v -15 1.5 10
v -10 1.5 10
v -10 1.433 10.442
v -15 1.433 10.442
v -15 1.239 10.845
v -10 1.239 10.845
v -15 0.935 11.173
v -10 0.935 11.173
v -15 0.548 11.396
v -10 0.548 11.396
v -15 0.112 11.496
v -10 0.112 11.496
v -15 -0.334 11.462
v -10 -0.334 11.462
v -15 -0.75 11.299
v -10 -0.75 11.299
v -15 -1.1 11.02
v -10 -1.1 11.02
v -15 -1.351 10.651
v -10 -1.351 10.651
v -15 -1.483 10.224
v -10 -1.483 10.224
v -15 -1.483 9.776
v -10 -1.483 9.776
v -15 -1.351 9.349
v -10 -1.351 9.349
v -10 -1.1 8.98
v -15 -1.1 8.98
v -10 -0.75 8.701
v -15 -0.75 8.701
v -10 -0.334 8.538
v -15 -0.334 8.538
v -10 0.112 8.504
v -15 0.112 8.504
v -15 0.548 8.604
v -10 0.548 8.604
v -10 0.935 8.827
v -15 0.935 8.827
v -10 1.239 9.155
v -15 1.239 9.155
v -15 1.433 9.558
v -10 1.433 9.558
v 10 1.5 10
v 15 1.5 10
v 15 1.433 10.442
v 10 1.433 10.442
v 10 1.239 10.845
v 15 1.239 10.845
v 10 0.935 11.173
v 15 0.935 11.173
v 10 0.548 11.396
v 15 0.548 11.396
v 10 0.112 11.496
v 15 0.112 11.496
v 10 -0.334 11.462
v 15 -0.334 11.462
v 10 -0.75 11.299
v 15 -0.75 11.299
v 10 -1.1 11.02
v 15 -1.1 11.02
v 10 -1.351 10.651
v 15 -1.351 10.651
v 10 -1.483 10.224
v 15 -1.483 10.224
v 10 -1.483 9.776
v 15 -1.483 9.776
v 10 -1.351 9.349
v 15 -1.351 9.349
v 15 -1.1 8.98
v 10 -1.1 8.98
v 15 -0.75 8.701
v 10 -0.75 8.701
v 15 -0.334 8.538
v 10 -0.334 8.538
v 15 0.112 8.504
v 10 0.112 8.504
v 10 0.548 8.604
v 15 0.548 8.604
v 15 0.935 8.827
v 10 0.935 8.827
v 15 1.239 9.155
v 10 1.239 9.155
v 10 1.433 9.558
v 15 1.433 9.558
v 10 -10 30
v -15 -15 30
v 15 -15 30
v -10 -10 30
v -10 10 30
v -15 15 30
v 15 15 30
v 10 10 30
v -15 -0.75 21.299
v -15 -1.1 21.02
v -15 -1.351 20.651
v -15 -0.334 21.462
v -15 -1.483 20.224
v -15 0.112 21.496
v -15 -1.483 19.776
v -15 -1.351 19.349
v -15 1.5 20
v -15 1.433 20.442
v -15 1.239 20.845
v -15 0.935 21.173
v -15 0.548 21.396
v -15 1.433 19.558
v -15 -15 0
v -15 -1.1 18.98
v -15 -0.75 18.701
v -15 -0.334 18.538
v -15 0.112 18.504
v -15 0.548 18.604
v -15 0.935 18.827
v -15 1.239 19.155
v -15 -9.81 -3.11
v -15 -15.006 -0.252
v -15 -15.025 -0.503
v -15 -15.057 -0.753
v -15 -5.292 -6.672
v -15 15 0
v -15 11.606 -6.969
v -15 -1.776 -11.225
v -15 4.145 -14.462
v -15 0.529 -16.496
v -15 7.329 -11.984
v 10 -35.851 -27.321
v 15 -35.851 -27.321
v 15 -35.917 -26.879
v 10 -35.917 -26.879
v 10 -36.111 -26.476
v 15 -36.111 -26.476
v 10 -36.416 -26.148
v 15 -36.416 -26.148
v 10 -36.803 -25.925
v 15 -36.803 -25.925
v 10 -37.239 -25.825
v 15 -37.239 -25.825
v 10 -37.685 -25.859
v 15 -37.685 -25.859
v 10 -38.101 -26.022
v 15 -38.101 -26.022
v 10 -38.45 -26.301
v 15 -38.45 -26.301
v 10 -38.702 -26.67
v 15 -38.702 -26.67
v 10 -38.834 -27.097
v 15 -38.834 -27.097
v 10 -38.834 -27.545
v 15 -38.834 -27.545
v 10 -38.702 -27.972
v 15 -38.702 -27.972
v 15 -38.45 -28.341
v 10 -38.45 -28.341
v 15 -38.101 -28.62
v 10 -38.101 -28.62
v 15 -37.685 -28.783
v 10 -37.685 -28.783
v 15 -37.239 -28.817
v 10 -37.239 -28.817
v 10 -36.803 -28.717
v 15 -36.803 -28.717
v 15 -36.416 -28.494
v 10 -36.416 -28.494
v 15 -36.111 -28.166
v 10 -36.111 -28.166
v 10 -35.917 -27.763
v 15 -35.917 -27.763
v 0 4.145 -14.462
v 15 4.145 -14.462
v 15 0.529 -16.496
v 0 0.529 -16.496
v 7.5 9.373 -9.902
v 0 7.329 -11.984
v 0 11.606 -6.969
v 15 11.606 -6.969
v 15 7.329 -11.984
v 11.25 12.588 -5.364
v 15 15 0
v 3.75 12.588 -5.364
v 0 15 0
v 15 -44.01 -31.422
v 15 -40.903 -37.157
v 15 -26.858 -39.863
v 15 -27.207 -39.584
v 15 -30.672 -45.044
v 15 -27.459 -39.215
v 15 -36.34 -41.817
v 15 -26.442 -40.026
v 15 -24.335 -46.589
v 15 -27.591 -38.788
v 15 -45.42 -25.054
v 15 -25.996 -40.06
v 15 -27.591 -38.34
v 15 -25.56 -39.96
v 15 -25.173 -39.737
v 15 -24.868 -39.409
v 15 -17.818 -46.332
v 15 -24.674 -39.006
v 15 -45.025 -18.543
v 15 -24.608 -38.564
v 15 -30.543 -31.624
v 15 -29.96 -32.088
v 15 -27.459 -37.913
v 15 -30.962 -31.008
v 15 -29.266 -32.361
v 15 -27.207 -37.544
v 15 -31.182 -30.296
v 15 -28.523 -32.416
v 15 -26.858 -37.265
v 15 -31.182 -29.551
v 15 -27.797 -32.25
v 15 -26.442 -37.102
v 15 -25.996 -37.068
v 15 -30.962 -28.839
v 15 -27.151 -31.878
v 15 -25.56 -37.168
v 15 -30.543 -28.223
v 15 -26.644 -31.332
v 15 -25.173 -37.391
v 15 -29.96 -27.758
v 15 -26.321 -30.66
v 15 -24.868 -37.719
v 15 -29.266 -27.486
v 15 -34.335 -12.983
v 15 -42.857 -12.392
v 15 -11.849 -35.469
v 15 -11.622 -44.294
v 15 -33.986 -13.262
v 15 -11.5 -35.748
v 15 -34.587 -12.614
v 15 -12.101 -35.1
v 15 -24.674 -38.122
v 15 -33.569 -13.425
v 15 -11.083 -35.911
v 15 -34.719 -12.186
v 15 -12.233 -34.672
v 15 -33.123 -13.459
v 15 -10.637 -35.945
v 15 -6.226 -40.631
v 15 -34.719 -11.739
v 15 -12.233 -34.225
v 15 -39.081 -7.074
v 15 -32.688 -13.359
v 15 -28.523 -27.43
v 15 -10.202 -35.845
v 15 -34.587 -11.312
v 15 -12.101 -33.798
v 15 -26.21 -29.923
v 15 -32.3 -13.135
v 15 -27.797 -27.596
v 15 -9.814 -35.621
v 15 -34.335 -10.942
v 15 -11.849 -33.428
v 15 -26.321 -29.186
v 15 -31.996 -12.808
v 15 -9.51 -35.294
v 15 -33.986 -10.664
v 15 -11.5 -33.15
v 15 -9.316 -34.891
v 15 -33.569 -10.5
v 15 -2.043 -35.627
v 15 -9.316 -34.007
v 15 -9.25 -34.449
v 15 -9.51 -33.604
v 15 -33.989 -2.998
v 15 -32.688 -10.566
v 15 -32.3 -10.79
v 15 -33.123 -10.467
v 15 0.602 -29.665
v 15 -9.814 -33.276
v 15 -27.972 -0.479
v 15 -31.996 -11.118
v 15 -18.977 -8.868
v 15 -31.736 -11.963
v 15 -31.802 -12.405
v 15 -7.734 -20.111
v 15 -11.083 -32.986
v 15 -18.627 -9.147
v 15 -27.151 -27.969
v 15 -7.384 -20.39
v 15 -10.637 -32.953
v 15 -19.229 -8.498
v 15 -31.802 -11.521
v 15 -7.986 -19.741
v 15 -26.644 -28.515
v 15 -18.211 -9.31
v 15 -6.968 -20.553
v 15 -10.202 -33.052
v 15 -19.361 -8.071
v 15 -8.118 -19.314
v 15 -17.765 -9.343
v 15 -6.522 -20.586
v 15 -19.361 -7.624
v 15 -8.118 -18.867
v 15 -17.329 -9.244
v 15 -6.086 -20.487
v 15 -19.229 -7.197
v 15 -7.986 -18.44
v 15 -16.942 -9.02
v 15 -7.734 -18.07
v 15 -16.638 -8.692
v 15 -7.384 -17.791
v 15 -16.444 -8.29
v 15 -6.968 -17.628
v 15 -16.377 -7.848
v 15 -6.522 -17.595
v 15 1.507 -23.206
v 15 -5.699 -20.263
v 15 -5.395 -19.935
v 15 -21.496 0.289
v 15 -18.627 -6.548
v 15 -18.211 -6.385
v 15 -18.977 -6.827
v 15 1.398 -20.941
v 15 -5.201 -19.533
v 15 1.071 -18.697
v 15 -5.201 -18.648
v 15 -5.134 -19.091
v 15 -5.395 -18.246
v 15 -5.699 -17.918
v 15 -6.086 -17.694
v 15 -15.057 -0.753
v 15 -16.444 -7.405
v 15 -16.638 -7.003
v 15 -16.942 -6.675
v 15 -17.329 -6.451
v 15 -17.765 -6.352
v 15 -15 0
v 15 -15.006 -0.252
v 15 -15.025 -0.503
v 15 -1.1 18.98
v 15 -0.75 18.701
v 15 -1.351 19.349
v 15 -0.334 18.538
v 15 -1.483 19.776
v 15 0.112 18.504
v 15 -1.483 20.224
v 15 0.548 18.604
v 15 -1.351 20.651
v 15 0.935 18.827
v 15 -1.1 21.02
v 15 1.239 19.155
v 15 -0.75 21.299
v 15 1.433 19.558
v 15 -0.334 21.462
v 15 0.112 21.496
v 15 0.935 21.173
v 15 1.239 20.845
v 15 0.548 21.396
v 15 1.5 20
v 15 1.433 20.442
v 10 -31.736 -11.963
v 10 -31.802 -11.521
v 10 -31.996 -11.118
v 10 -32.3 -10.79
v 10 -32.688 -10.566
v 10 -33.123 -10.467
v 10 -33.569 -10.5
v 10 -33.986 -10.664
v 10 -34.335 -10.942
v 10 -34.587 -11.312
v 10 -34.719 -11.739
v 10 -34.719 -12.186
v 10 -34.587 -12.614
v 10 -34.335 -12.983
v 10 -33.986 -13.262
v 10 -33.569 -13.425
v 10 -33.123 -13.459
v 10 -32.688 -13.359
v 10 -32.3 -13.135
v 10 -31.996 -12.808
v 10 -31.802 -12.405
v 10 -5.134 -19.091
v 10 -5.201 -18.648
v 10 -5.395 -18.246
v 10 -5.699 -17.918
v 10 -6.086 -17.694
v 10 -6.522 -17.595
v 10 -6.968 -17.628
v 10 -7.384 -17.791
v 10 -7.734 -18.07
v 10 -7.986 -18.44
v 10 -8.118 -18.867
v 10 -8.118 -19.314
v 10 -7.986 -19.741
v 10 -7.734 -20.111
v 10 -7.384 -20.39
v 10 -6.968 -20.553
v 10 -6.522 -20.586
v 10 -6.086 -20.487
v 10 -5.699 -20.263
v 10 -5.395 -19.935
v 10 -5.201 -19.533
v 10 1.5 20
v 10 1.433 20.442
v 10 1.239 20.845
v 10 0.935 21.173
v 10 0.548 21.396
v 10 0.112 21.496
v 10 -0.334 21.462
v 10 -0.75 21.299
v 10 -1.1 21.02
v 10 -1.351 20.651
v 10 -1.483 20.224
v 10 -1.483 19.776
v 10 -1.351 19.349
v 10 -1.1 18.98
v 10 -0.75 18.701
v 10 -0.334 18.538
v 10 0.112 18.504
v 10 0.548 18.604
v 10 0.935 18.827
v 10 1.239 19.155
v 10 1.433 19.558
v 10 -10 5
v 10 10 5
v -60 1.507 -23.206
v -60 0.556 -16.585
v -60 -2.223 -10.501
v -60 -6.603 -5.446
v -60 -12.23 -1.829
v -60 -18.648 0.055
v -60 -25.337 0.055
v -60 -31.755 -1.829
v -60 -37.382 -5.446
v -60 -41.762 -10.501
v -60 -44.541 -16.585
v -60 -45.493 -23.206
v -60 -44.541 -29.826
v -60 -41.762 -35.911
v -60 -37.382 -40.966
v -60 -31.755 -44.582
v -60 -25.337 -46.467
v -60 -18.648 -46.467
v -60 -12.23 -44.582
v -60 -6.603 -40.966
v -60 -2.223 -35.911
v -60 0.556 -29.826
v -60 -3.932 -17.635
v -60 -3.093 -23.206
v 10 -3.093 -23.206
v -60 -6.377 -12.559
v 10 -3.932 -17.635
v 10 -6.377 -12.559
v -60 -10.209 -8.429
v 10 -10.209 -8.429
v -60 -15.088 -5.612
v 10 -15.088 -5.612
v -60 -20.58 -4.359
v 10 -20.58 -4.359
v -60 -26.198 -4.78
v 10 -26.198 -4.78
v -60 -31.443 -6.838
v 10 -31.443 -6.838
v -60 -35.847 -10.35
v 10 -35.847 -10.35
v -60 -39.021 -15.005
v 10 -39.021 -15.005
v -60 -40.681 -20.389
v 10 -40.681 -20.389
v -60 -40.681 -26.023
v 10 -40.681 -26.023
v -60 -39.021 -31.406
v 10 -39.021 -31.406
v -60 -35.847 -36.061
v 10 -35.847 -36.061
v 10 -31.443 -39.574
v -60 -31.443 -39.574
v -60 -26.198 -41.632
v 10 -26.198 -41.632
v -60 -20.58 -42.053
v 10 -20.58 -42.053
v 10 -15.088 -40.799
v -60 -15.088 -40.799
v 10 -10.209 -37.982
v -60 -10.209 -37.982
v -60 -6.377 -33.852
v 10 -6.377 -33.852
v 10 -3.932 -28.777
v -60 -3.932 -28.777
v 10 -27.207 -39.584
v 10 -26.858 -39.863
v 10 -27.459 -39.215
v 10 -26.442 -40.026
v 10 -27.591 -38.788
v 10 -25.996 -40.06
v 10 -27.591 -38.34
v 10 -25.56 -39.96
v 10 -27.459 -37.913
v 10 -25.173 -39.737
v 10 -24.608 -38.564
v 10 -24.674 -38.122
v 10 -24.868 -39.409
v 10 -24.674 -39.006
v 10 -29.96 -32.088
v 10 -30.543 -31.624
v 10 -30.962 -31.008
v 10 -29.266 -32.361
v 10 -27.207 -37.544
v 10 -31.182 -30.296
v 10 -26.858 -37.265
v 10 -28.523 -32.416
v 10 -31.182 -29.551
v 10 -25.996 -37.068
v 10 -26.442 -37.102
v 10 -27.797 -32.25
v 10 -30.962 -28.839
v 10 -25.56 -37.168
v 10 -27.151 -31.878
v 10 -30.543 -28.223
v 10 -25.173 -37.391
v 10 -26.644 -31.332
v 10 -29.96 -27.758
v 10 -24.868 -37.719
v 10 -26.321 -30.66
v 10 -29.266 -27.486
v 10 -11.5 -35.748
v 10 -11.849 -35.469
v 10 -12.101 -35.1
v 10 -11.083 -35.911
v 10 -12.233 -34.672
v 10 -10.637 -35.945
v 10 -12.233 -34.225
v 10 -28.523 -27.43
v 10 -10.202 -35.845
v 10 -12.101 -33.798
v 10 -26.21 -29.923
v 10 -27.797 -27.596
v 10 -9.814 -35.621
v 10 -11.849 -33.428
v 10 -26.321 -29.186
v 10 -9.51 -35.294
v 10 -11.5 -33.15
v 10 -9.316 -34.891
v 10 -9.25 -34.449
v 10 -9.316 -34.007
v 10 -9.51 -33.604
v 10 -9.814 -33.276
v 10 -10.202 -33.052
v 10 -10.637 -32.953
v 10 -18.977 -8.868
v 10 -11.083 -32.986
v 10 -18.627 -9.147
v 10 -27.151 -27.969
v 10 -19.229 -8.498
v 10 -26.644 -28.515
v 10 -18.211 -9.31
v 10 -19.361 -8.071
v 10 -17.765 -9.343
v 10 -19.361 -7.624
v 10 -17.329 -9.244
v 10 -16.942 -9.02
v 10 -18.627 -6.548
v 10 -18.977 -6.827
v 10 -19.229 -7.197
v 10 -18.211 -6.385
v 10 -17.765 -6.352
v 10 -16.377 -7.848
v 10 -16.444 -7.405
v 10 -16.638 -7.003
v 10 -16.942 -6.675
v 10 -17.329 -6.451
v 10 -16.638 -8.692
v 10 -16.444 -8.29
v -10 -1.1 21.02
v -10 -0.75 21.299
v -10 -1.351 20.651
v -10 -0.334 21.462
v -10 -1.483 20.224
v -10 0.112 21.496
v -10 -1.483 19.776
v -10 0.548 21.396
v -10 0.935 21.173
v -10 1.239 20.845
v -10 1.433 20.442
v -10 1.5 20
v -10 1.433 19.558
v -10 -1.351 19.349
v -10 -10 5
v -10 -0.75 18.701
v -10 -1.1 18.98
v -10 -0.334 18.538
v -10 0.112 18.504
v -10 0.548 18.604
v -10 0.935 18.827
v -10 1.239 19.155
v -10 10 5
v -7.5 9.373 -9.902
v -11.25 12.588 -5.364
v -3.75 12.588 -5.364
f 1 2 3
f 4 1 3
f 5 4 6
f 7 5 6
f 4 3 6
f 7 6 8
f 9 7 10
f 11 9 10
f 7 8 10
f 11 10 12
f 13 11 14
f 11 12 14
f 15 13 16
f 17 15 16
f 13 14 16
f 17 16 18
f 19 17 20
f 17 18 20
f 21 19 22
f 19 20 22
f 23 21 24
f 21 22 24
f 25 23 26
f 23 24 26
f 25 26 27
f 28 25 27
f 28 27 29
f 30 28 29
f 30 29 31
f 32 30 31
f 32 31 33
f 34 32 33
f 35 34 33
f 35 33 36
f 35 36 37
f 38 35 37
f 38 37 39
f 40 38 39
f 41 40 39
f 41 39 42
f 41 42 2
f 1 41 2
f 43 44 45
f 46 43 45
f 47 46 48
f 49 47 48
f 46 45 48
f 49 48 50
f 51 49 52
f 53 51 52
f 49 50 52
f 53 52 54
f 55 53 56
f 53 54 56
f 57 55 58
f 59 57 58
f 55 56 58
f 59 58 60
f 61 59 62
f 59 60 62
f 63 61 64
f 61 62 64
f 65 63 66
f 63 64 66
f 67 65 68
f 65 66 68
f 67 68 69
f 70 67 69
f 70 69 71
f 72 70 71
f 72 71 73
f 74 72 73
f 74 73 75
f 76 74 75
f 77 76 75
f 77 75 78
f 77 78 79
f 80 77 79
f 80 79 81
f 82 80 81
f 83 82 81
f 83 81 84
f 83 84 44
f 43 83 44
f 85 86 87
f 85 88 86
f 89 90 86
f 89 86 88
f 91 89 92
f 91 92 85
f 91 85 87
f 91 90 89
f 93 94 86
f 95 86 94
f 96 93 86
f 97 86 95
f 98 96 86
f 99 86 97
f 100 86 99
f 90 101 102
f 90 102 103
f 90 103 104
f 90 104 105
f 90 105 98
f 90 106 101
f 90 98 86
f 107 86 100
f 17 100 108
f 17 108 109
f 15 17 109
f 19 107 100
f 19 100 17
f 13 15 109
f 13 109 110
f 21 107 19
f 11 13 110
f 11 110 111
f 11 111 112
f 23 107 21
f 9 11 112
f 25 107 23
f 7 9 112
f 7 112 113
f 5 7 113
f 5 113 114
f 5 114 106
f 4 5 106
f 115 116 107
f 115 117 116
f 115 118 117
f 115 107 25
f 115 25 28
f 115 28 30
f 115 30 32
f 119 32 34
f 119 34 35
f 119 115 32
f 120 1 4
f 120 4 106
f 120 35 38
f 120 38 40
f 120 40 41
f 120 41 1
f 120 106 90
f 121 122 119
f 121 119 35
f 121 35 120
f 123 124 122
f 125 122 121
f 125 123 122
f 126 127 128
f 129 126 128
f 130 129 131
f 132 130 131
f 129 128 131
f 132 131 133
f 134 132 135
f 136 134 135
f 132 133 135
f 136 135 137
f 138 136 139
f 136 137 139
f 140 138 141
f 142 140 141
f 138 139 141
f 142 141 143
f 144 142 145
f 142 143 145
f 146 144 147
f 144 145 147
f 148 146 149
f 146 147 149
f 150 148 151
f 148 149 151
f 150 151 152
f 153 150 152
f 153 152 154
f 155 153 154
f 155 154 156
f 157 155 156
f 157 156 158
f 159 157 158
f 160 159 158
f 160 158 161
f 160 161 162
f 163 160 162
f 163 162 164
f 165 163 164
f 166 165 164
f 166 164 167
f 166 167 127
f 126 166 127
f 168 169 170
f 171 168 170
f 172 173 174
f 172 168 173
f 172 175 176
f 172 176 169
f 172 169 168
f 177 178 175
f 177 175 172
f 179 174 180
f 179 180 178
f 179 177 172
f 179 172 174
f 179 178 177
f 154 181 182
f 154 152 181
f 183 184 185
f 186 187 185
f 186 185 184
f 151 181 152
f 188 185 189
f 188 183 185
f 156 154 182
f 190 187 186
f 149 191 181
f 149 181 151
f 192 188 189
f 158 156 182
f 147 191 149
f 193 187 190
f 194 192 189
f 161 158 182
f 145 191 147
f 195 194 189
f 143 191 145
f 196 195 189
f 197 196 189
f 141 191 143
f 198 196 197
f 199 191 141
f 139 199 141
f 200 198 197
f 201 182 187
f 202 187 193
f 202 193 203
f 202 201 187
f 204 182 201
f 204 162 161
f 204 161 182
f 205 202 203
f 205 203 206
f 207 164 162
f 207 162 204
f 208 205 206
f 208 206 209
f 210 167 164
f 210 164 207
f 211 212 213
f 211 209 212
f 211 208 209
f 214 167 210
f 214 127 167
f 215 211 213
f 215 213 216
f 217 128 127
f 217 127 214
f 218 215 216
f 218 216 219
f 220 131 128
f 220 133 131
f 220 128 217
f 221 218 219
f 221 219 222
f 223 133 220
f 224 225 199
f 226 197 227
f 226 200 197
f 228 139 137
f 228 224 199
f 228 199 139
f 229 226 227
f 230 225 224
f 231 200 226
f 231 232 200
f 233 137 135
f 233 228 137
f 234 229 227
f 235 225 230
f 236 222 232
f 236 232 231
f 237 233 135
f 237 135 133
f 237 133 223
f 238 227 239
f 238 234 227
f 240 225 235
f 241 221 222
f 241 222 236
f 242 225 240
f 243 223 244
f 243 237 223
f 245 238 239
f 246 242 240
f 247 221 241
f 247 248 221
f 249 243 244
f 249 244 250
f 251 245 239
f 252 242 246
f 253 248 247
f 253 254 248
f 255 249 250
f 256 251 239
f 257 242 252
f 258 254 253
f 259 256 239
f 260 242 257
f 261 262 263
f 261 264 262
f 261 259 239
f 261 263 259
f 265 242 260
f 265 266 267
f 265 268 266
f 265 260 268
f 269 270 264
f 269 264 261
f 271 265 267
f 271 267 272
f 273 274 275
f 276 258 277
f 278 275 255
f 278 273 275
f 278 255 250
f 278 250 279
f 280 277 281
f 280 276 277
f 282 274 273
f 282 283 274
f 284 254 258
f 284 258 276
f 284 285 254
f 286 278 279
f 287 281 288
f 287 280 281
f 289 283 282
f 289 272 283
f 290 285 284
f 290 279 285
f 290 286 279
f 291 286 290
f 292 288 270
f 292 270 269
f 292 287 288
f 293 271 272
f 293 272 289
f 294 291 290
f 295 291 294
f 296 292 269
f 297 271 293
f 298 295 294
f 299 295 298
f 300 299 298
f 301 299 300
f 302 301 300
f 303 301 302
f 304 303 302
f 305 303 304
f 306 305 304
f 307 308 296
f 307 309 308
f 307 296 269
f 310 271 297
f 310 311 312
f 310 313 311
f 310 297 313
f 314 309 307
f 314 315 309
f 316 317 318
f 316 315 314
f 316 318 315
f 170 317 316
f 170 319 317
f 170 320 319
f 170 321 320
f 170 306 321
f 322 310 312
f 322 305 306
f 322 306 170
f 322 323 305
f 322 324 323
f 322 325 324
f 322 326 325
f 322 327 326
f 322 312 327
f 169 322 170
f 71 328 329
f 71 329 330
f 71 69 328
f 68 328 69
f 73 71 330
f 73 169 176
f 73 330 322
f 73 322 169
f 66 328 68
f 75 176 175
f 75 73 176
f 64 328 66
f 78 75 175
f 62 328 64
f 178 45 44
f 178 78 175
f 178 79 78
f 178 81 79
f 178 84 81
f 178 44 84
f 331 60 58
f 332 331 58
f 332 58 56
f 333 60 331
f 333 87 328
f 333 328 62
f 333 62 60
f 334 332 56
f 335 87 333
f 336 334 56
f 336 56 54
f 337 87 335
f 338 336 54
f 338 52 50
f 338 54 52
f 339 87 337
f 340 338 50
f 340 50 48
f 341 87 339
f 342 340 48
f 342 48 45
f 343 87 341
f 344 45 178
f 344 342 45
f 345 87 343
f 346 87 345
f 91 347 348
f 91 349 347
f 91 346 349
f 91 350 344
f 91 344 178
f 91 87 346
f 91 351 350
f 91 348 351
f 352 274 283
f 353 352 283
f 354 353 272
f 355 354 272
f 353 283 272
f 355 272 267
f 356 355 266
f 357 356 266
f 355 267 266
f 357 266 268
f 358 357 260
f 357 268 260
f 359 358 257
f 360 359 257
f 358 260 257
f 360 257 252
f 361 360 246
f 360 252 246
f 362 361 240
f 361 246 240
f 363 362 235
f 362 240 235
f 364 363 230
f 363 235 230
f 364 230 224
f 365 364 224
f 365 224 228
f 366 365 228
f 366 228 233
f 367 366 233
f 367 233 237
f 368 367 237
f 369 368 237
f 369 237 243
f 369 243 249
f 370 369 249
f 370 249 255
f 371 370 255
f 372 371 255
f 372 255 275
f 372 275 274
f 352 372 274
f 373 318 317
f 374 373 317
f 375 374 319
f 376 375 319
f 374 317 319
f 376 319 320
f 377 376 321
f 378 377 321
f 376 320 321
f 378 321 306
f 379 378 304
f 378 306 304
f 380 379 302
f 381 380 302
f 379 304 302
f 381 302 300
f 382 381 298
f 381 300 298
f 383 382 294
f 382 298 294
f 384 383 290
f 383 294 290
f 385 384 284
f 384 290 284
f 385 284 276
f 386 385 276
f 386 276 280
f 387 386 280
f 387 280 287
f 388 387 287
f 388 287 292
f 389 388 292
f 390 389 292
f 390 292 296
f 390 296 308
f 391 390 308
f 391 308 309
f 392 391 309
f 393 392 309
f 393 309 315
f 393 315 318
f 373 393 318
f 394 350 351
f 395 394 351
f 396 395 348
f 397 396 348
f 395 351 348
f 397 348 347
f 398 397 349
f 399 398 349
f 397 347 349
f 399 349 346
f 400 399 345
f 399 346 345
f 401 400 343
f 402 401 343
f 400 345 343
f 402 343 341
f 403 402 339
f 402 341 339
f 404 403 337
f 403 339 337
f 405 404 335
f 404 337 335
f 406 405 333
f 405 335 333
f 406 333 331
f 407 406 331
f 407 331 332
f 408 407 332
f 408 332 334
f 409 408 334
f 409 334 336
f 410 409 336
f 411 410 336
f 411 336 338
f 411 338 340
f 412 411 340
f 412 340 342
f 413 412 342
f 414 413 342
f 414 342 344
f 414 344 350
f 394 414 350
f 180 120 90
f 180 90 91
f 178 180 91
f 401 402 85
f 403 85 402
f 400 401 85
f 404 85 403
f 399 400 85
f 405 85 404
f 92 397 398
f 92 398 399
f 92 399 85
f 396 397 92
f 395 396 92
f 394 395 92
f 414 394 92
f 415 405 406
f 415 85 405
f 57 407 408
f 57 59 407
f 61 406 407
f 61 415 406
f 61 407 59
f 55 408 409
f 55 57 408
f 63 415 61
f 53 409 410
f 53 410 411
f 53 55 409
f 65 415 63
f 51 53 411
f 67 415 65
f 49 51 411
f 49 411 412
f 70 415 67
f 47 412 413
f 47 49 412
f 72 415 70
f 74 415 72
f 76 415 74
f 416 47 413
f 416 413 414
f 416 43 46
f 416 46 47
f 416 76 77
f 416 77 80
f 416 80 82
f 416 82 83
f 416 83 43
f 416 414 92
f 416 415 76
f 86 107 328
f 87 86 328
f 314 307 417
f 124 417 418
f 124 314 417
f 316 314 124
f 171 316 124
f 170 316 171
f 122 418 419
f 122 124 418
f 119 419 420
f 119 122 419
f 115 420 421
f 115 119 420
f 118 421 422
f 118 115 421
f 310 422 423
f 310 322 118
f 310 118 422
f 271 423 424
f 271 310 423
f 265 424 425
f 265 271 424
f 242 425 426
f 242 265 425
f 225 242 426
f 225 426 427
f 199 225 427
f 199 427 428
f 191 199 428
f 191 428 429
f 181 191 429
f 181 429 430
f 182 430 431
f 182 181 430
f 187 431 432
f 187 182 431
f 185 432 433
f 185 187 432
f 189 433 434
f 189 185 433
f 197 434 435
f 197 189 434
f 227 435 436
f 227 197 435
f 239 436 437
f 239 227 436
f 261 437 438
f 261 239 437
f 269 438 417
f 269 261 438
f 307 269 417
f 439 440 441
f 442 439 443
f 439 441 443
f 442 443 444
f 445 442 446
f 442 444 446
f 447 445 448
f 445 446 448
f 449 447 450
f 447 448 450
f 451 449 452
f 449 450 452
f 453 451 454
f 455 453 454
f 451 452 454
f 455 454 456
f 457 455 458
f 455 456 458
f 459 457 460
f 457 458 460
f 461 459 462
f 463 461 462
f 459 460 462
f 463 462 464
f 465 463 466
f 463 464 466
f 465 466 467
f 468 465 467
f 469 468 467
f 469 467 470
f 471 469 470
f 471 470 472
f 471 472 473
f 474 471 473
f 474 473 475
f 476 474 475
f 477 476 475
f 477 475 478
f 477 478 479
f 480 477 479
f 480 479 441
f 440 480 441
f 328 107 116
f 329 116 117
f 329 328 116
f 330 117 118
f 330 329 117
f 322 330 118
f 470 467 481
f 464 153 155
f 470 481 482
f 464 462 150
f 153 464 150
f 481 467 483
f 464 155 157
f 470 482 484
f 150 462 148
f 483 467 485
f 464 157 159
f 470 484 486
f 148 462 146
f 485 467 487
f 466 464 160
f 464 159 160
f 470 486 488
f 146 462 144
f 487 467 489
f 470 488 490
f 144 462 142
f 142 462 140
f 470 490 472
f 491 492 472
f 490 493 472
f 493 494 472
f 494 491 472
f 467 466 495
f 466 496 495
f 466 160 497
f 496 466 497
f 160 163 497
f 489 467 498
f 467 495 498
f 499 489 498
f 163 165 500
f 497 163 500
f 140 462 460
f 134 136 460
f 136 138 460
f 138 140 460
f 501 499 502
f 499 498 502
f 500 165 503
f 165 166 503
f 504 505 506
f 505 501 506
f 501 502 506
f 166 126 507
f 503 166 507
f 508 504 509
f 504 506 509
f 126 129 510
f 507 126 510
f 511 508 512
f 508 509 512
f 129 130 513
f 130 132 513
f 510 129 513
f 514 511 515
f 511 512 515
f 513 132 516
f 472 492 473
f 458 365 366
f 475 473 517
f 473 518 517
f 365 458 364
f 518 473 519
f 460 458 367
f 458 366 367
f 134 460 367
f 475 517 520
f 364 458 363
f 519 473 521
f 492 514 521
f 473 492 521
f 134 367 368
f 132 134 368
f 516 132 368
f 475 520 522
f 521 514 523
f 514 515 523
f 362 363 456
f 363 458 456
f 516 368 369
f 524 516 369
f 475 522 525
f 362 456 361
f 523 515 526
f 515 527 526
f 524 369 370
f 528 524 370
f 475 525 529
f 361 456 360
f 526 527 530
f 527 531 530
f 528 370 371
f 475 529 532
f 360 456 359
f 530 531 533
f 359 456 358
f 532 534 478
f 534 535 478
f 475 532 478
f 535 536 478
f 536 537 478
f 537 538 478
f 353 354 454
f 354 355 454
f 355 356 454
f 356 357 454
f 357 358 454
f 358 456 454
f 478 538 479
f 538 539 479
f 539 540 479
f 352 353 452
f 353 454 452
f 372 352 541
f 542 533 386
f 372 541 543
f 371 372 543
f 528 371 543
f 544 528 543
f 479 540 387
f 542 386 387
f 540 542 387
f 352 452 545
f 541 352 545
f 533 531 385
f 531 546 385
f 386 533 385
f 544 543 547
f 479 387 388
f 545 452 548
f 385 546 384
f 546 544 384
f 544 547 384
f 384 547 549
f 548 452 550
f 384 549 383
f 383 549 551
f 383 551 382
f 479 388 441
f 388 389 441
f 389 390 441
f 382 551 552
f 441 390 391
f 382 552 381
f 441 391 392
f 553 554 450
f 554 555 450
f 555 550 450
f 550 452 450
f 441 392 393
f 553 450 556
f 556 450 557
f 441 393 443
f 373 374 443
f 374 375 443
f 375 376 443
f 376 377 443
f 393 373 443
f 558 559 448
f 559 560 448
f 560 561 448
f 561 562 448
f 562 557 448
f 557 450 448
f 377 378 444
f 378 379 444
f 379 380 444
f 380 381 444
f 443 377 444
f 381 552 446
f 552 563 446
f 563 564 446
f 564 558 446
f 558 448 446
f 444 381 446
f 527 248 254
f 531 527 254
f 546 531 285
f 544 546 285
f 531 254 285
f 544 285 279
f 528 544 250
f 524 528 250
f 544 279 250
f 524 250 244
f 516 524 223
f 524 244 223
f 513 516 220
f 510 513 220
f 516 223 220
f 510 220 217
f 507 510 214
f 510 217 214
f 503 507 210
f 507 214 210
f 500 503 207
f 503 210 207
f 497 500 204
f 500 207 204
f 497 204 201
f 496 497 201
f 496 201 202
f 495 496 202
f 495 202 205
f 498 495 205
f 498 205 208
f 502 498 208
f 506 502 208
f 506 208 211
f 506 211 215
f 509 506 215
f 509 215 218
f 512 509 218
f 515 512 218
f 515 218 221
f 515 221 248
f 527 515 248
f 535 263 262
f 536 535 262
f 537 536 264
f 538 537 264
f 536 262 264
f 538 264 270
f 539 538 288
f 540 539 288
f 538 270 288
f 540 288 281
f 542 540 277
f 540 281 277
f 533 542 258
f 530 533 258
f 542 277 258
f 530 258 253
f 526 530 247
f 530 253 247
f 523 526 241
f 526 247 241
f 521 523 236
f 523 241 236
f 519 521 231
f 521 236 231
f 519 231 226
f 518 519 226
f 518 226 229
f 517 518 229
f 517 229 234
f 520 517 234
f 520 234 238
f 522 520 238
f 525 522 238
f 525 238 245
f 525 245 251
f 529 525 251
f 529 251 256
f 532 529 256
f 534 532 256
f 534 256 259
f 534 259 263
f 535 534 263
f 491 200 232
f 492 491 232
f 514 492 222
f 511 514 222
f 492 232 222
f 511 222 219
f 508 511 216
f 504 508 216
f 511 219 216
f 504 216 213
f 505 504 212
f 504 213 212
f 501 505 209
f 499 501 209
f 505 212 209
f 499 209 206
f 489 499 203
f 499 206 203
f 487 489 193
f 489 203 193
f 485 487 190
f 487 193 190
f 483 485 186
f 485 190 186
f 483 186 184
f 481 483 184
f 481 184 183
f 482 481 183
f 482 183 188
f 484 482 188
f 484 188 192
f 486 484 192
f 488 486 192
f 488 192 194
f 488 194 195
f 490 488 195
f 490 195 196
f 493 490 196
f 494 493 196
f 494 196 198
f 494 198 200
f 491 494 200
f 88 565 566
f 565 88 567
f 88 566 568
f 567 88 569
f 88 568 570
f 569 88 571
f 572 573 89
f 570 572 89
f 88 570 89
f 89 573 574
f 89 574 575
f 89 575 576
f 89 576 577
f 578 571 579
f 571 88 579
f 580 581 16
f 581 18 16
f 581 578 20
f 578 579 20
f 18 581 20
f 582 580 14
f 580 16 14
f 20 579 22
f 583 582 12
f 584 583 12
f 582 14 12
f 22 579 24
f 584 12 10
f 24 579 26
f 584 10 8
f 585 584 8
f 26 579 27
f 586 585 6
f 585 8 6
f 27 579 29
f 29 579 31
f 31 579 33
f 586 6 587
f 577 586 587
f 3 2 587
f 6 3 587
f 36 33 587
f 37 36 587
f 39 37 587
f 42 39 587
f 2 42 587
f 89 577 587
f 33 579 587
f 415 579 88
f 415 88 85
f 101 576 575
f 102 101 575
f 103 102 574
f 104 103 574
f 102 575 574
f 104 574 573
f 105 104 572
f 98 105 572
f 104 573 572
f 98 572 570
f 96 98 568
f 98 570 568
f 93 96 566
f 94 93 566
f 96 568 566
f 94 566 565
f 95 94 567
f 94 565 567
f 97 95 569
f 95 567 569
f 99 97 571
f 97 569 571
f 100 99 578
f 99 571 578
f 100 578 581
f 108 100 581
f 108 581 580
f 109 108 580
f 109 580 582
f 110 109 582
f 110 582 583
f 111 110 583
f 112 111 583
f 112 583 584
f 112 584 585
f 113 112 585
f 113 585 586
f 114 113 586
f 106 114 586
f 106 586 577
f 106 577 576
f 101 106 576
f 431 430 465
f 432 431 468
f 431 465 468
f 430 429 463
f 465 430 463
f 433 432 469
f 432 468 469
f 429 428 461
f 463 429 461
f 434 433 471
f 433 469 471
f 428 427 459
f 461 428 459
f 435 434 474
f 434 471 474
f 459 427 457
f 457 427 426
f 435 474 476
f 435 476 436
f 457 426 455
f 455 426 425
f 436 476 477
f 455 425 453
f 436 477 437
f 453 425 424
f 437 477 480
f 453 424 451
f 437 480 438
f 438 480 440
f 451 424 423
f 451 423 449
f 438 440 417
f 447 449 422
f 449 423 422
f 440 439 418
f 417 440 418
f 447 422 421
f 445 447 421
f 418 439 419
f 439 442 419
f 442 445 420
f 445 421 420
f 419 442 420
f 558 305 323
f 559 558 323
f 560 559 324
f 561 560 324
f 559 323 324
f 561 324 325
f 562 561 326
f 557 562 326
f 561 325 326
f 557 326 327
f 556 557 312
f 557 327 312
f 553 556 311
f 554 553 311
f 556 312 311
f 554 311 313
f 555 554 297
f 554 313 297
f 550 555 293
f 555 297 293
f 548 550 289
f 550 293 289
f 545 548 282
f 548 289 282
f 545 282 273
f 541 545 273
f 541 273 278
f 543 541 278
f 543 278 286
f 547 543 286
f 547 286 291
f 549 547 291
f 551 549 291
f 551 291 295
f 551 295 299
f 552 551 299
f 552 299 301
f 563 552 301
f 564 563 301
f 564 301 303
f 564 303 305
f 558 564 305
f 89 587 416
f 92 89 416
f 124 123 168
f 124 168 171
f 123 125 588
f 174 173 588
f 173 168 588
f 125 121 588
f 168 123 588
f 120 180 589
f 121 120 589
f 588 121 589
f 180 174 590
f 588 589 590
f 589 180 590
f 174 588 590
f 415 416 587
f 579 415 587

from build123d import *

# Parameters (mm, degrees)
SKETCH1_W           = 30
SKETCH1_H           = 30
SKETCH1_W_2         = 20
SKETCH1_H_2         = 20
BOSS_EXTRUDE1_DEPTH = 30
SKETCH21_R          = 1.5
CUT_EXTRUDE1_DEPTH  = 46
SKETCH22_W          = 30
SKETCH22_H          = 30
BOSS_EXTRUDE2_DEPTH = 5
BOSS_EXTRUDE4_DEPTH = 15
SKETCH26_R          = 23.5
BOSS_EXTRUDE5_DEPTH = 75
SKETCH27_R          = 18.9
CUT_EXTRUDE2_DEPTH  = 100.378046072
SKETCH28_R          = 18.9
BOSS_EXTRUDE6_DEPTH = 5
SKETCH29_R          = 1.5
SKETCH29_R_2        = 2.5
CUT_EXTRUDE3_DEPTH  = 8


with BuildPart() as part:
    # Sketch1 → Boss-Extrude1 (new body)
    with BuildSketch(Plane.XY):
        Rectangle(SKETCH1_W, SKETCH1_H)
        Rectangle(SKETCH1_W_2, SKETCH1_H_2, mode=Mode.SUBTRACT)
    extrude(amount=BOSS_EXTRUDE1_DEPTH)

    # Sketch21 → Cut-Extrude1 (cut, through all)
    with BuildSketch(Plane(origin=(15, 0, 0), x_dir=(0, 0, -1), z_dir=(1, 0, 0))):
        with Locations(Location((-10, 0, 0), (0, 0, 90))):
            Circle(SKETCH21_R)
        with Locations(Location((-20, 0, 0), (0, 0, 90))):
            Circle(SKETCH21_R)
    extrude(amount=-CUT_EXTRUDE1_DEPTH, mode=Mode.SUBTRACT)

    # Sketch22 → Boss-Extrude2 (add)
    with BuildSketch(Plane(origin=(0, 0, 0), x_dir=(-1, 0, 0), z_dir=(0, 0, -1))):
        Rectangle(SKETCH22_W, SKETCH22_H)
    extrude(amount=-BOSS_EXTRUDE2_DEPTH)

    # Sketch25 → Boss-Extrude4 (add, symmetric)
    with BuildSketch(Plane(origin=(0, 0, 0), x_dir=(0, 0, -1), z_dir=(1, 0, 0))):
        with BuildLine():
            Line((0, 15), (0, -15))
            ThreePointArc((0, -15), (1.913417162, -15.380602337), (3.535533906, -16.464466094))
            Line((3.535533906, -16.464466094), (22.852181054, -35.781113242))
            Line((22.852181054, -35.781113242), (36.994316678, -21.638977618))
            Line((36.994316678, -21.638977618), (17.67766953, -2.32233047))
            add(Edge.make_bspline(
                [(0, 15), (13.071207338, 10.453425887), (17.67766953, -2.32233047)],
                knots=[0, 0, 0, 1, 1, 1], degree=2))
        make_face()
    extrude(amount=BOSS_EXTRUDE4_DEPTH, both=True)

    # Sketch26 → Boss-Extrude5 (add)
    with BuildSketch(Plane(origin=(15, 0, 0), x_dir=(0, 0, -1), z_dir=(1, 0, 0))):
        with Locations(Location((23.205734445, -21.992531009, 0), (0, 0, 90))):
            Circle(SKETCH26_R)
    extrude(amount=-BOSS_EXTRUDE5_DEPTH)

    # Sketch27 → Cut-Extrude2 (cut, through all)
    with BuildSketch(Plane(origin=(15, 0, 0), x_dir=(0, 0, -1), z_dir=(1, 0, 0))):
        with Locations(Location((23.205734445, -21.992531009, 0), (0, 0, 90))):
            Circle(SKETCH27_R)
    extrude(amount=-CUT_EXTRUDE2_DEPTH, mode=Mode.SUBTRACT)

    # Sketch28 → Boss-Extrude6 (add)
    with BuildSketch(Plane(origin=(15, 0, 0), x_dir=(0, 0, -1), z_dir=(1, 0, 0))):
        with Locations(Location((23.205734445, -21.992531009, 0), (0, 0, 90))):
            Circle(SKETCH28_R)
    extrude(amount=-BOSS_EXTRUDE6_DEPTH)

    # Sketch29 → Cut-Extrude3 (cut)
    with BuildSketch(Plane(origin=(15, 0, 0), x_dir=(0, 0, -1), z_dir=(1, 0, 0))):
        with Locations(Location((34.448732265, -10.749533188, 0), (0, 0, 90))):
            Circle(SKETCH29_R)
        with Locations(Location((38.563955083, -26.107753826, 0), (0, 0, 90))):
            Circle(SKETCH29_R)
        with Locations(Location((27.320957262, -37.350751647, 0), (0, 0, 90))):
            Circle(SKETCH29_R)
        with Locations(Location((11.962736624, -33.23552883, 0), (0, 0, 90))):
            Circle(SKETCH29_R)
        with Locations(Location((7.847513807, -17.877308192, 0), (0, 0, 90))):
            Circle(SKETCH29_R)
        with Locations(Location((19.090511627, -6.634310371, 0), (0, 0, 90))):
            Circle(SKETCH29_R)
        with Locations(Location((29.923248866, -28.71004543, 0), (0, 0, 90))):
            Circle(SKETCH29_R_2)
    extrude(amount=-CUT_EXTRUDE3_DEPTH, mode=Mode.SUBTRACT)


solid = part.part
